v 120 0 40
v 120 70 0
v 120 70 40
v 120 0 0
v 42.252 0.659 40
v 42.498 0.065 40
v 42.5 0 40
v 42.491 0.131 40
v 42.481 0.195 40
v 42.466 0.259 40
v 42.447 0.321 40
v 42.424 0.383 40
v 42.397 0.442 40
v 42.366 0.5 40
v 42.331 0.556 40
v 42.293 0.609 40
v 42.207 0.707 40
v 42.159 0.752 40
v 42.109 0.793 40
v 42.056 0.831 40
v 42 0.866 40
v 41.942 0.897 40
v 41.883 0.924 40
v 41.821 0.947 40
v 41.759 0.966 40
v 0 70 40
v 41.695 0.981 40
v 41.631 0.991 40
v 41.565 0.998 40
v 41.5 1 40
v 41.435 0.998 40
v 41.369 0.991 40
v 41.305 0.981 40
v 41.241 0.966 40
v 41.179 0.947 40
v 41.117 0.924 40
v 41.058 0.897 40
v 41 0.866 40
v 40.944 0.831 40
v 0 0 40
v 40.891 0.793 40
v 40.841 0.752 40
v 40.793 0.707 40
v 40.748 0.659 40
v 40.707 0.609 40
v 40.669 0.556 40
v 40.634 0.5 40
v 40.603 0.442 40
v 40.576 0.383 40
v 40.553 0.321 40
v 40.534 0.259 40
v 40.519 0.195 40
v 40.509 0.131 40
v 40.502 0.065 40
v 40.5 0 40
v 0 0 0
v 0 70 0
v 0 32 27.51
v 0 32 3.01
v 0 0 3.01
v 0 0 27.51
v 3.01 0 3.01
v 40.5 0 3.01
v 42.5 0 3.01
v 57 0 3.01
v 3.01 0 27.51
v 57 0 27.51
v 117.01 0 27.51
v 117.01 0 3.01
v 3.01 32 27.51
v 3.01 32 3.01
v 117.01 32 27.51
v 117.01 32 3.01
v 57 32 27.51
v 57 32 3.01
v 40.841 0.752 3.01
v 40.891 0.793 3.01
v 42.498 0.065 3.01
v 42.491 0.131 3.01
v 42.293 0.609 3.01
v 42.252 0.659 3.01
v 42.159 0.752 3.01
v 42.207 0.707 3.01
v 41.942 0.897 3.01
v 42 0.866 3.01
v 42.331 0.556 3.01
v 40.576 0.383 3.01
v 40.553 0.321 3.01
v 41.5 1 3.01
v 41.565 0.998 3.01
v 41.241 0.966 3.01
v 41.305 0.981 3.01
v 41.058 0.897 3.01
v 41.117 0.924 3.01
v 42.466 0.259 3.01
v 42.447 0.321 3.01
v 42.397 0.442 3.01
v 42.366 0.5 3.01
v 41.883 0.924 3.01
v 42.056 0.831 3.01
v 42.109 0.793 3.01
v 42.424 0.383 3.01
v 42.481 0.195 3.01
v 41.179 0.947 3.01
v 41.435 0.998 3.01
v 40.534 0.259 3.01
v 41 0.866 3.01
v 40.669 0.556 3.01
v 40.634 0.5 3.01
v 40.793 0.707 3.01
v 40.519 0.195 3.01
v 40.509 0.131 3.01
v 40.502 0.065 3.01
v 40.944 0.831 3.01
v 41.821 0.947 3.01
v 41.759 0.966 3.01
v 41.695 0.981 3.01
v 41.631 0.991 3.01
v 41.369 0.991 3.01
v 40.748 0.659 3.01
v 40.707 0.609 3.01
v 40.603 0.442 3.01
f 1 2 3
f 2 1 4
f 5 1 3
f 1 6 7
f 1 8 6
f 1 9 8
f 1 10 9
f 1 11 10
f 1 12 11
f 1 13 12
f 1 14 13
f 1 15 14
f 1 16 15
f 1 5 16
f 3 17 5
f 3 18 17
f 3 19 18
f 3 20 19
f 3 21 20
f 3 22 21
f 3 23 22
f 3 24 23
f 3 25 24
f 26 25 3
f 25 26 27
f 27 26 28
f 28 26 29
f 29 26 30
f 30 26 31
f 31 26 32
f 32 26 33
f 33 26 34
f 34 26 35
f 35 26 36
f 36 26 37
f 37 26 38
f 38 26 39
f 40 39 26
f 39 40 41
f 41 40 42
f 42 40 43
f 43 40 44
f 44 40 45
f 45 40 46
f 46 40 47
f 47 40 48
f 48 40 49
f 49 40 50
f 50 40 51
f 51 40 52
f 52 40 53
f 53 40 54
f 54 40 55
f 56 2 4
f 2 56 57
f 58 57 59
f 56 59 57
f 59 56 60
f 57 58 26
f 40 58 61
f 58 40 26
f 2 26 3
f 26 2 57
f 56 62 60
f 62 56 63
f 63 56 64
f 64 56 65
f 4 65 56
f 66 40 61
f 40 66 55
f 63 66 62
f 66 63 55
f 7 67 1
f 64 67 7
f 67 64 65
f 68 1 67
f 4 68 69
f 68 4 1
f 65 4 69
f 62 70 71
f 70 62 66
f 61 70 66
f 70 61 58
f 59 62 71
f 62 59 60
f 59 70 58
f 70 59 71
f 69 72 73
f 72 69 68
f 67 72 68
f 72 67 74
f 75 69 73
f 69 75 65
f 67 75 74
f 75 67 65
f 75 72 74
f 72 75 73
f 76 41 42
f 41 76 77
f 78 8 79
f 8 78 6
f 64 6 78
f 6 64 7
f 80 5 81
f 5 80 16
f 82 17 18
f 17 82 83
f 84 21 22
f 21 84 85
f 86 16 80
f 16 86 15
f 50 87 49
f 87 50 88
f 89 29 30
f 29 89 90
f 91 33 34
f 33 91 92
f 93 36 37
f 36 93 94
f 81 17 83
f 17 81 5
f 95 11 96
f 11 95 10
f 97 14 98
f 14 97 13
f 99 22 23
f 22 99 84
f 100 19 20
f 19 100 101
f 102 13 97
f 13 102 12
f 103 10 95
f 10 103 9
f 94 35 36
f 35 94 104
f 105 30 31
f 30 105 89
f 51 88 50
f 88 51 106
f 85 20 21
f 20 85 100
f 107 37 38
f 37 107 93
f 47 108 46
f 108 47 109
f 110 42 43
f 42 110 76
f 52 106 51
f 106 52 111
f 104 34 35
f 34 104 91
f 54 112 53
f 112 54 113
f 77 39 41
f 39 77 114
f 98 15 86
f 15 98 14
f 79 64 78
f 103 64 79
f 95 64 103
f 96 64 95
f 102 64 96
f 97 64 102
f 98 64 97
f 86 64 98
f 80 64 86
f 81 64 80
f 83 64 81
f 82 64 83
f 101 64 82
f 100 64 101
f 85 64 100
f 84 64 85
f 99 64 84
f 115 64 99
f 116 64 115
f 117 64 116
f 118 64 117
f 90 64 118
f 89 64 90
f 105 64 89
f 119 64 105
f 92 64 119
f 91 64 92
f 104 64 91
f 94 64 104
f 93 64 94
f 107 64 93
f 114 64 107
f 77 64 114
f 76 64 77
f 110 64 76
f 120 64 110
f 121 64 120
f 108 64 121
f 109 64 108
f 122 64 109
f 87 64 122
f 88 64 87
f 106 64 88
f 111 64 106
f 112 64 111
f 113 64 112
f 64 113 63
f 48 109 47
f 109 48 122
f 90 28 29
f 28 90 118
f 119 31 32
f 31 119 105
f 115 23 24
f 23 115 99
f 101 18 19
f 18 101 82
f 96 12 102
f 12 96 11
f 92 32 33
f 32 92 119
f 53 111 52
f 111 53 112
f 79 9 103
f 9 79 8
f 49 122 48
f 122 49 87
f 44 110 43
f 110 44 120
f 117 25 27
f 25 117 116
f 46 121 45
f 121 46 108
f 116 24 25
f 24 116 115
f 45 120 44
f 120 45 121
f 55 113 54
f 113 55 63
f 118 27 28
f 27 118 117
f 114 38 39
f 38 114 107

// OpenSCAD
// Buffer tank for mini horizontal gel-electrophoresis box
// Units: mm. Tank rests on XY plane (z = 0), builds upward.

$fn = 96;

// ---- Tank ----
tank_x      = 120;   // outer length (X)
tank_y      = 70;    // outer width (Y)
tank_h      = 40;    // outer height (Z)
wall        = 3;     // wall thickness
floor_t     = 3;     // floor thickness

// ---- Gel-tray platform ----
plat_x      = 60;    // platform length in X (centred)
plat_top_z  = 13;    // platform top height above inner floor (z = 13)

// ---- Electrode holes ----
hole_d      = 2;     // electrode hole diameter
hole_y      = 0;     // electrode hole Y position
hole_w_z    = tank_h - floor_t; // hole spans from top of floor to tank top

// ---- Cutting overlap ----
eps         = 0.5;   // extension of cutters past faces

// ---- Derived ----
inner_x = tank_x - 2 * wall;          // 114
inner_y = tank_y - 2 * wall;          // 64
inner_z = tank_h - floor_t;           // 37
plat_z0 = floor_t + 0.01;             // platform bottom just above floor

// ---- Model ----
difference() {
    // Open-top tank
    cube([tank_x, tank_y, tank_h]);

    // Two blocks removing the buffer space above the platform
    translate([-inner_x / 2, -inner_y / 2, plat_z0])
        cube([plat_x + 0.01, inner_y, inner_z - plat_top_z + eps]);
    translate([ inner_x / 2, -inner_y / 2, plat_z0])
        cube([plat_x + 0.01, inner_y, inner_z - plat_top_z + eps]);

    // Horizontal electrode holes through each end wall (along X)
    translate([tank_x / 2 - hole_w_z / 2, hole_y, floor_t + 0.01])
        cylinder(d = hole_d, h = hole_w_z);
    translate([-tank_x / 2 + hole_w_z / 2, hole_y, floor_t + 0.01])
        cylinder(d = hole_d, h = hole_w_z);
}
